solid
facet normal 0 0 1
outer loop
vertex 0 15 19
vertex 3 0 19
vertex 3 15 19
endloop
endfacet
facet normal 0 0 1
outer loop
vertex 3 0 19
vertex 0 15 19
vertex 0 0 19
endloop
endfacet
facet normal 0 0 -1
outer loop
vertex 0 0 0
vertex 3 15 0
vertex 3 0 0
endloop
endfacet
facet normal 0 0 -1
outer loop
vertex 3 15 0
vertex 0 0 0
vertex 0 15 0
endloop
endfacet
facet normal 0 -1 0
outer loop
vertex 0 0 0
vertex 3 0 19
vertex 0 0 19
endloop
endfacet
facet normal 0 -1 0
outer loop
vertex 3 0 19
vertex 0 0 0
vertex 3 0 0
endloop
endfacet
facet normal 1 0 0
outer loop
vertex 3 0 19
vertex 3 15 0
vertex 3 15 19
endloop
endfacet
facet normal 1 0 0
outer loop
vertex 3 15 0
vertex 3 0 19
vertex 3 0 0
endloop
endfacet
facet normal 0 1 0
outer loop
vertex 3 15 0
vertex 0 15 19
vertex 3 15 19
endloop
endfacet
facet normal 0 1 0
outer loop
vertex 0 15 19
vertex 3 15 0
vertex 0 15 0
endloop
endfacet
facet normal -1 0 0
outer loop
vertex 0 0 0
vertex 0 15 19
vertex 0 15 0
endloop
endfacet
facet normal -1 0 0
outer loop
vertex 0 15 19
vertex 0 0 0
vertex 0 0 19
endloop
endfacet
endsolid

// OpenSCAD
// Generated by SolidPython 1.0.1 on 2020-07-29 00:39:26


cube(size = [3, 15, 19]);
/***********************************************
*********      SolidPython code:      **********
************************************************
 
# import packages: SolidPython
from solid import *
from solid.utils import *
from itertools import chain, combinations


class Resize:

    def __init__(self, scad_file):
        self.scad_file = scad_file
        #self.scad_file = import_scad(scad_file)
        # cone/cylinder param:
        self.r1 = 0
        self.r2 = 0
        self.h = 0
        # rectangular prism param:
        self.w = 0
        self.l = 0
        # ellipse param:
        self.r = 0

    # import OpenScad code (file name corresponds to shape)


    # classify shape + parameters
    def assign(self, param1, param2, param3):
        if self.scad_file == 'cone.scad':
            self.r1 = param1
            self.r2 = param2
            self.h = param3
        elif self.scad_file == 'cylinder.scad':
            self.r1 = param1
            self.r2 = param2
            self.h = param3
        elif self.scad_file == 'rectangularPrism.scad':
            self.h = param1
            self.l = param2
            self.w = param3
        else:
            self.r = param1
            self.h = param2

    # resize parameters
    def iterate(self):
        x = range(3, 20, 2)
        i = 1
        if self.scad_file == 'cone.scad':
            tempList = list(combinations(x, 2))
            for temp in tempList:
                param1 = temp[0]
                param2 = temp[1]
                filepath = 'produced_scad_files/' + 'cone' + str(param1) + '_' + str(param2) + '_' + '.scad'
                scad_render_to_file(cylinder(h=param1, r1=param2, r2=0), filepath)

        elif self.scad_file == 'cylinder.scad':
            tempList = list(combinations(x, 3))
            for temp in tempList:
                param1 = temp[0]
                param2 = temp[1]
                filepath = 'produced_scad_files/' + 'cylinder' + str(param1) + '_' + str(param2) + '_' + '.scad'
                scad_render_to_file(cylinder(h=param1, r1=param2, r2=param2), filepath)

        elif self.scad_file == 'rectangularPrism.scad':
            tempList = list(combinations(x, 3))
            for temp in tempList:
                param1 = temp[0]
                param2 = temp[1]
                param3 = temp[2]
                filepath = 'produced_scad_files/' + 'rectangularPrism' + str(param1) + '_' + str(param2) + '_' + str(
                    param3) + '.scad'
                scad_render_to_file(cube(size=(param1, param2, param3)), filepath)

        elif self.scad_file == 'ellipse.scad':
            tempList = list(combinations(x, 4))
            for temp in tempList:
                param1 = temp[0]
                param2 = temp[1]
                param3 = temp[2]
                param4 = temp[3]
                filepath = 'produced_scad_files/' + 'ellipse' + str(param1) + '_' + str(param2) + '_' + str(param3) + '_' + str(param4) + '.scad'
                scad_render_to_file(scale([param1, param2, param3])(sphere(r=param4)), filepath)

    def render_to_scadfile(self):
        scad_render_to_file(scad, 'example.scad') 
 
************************************************/
